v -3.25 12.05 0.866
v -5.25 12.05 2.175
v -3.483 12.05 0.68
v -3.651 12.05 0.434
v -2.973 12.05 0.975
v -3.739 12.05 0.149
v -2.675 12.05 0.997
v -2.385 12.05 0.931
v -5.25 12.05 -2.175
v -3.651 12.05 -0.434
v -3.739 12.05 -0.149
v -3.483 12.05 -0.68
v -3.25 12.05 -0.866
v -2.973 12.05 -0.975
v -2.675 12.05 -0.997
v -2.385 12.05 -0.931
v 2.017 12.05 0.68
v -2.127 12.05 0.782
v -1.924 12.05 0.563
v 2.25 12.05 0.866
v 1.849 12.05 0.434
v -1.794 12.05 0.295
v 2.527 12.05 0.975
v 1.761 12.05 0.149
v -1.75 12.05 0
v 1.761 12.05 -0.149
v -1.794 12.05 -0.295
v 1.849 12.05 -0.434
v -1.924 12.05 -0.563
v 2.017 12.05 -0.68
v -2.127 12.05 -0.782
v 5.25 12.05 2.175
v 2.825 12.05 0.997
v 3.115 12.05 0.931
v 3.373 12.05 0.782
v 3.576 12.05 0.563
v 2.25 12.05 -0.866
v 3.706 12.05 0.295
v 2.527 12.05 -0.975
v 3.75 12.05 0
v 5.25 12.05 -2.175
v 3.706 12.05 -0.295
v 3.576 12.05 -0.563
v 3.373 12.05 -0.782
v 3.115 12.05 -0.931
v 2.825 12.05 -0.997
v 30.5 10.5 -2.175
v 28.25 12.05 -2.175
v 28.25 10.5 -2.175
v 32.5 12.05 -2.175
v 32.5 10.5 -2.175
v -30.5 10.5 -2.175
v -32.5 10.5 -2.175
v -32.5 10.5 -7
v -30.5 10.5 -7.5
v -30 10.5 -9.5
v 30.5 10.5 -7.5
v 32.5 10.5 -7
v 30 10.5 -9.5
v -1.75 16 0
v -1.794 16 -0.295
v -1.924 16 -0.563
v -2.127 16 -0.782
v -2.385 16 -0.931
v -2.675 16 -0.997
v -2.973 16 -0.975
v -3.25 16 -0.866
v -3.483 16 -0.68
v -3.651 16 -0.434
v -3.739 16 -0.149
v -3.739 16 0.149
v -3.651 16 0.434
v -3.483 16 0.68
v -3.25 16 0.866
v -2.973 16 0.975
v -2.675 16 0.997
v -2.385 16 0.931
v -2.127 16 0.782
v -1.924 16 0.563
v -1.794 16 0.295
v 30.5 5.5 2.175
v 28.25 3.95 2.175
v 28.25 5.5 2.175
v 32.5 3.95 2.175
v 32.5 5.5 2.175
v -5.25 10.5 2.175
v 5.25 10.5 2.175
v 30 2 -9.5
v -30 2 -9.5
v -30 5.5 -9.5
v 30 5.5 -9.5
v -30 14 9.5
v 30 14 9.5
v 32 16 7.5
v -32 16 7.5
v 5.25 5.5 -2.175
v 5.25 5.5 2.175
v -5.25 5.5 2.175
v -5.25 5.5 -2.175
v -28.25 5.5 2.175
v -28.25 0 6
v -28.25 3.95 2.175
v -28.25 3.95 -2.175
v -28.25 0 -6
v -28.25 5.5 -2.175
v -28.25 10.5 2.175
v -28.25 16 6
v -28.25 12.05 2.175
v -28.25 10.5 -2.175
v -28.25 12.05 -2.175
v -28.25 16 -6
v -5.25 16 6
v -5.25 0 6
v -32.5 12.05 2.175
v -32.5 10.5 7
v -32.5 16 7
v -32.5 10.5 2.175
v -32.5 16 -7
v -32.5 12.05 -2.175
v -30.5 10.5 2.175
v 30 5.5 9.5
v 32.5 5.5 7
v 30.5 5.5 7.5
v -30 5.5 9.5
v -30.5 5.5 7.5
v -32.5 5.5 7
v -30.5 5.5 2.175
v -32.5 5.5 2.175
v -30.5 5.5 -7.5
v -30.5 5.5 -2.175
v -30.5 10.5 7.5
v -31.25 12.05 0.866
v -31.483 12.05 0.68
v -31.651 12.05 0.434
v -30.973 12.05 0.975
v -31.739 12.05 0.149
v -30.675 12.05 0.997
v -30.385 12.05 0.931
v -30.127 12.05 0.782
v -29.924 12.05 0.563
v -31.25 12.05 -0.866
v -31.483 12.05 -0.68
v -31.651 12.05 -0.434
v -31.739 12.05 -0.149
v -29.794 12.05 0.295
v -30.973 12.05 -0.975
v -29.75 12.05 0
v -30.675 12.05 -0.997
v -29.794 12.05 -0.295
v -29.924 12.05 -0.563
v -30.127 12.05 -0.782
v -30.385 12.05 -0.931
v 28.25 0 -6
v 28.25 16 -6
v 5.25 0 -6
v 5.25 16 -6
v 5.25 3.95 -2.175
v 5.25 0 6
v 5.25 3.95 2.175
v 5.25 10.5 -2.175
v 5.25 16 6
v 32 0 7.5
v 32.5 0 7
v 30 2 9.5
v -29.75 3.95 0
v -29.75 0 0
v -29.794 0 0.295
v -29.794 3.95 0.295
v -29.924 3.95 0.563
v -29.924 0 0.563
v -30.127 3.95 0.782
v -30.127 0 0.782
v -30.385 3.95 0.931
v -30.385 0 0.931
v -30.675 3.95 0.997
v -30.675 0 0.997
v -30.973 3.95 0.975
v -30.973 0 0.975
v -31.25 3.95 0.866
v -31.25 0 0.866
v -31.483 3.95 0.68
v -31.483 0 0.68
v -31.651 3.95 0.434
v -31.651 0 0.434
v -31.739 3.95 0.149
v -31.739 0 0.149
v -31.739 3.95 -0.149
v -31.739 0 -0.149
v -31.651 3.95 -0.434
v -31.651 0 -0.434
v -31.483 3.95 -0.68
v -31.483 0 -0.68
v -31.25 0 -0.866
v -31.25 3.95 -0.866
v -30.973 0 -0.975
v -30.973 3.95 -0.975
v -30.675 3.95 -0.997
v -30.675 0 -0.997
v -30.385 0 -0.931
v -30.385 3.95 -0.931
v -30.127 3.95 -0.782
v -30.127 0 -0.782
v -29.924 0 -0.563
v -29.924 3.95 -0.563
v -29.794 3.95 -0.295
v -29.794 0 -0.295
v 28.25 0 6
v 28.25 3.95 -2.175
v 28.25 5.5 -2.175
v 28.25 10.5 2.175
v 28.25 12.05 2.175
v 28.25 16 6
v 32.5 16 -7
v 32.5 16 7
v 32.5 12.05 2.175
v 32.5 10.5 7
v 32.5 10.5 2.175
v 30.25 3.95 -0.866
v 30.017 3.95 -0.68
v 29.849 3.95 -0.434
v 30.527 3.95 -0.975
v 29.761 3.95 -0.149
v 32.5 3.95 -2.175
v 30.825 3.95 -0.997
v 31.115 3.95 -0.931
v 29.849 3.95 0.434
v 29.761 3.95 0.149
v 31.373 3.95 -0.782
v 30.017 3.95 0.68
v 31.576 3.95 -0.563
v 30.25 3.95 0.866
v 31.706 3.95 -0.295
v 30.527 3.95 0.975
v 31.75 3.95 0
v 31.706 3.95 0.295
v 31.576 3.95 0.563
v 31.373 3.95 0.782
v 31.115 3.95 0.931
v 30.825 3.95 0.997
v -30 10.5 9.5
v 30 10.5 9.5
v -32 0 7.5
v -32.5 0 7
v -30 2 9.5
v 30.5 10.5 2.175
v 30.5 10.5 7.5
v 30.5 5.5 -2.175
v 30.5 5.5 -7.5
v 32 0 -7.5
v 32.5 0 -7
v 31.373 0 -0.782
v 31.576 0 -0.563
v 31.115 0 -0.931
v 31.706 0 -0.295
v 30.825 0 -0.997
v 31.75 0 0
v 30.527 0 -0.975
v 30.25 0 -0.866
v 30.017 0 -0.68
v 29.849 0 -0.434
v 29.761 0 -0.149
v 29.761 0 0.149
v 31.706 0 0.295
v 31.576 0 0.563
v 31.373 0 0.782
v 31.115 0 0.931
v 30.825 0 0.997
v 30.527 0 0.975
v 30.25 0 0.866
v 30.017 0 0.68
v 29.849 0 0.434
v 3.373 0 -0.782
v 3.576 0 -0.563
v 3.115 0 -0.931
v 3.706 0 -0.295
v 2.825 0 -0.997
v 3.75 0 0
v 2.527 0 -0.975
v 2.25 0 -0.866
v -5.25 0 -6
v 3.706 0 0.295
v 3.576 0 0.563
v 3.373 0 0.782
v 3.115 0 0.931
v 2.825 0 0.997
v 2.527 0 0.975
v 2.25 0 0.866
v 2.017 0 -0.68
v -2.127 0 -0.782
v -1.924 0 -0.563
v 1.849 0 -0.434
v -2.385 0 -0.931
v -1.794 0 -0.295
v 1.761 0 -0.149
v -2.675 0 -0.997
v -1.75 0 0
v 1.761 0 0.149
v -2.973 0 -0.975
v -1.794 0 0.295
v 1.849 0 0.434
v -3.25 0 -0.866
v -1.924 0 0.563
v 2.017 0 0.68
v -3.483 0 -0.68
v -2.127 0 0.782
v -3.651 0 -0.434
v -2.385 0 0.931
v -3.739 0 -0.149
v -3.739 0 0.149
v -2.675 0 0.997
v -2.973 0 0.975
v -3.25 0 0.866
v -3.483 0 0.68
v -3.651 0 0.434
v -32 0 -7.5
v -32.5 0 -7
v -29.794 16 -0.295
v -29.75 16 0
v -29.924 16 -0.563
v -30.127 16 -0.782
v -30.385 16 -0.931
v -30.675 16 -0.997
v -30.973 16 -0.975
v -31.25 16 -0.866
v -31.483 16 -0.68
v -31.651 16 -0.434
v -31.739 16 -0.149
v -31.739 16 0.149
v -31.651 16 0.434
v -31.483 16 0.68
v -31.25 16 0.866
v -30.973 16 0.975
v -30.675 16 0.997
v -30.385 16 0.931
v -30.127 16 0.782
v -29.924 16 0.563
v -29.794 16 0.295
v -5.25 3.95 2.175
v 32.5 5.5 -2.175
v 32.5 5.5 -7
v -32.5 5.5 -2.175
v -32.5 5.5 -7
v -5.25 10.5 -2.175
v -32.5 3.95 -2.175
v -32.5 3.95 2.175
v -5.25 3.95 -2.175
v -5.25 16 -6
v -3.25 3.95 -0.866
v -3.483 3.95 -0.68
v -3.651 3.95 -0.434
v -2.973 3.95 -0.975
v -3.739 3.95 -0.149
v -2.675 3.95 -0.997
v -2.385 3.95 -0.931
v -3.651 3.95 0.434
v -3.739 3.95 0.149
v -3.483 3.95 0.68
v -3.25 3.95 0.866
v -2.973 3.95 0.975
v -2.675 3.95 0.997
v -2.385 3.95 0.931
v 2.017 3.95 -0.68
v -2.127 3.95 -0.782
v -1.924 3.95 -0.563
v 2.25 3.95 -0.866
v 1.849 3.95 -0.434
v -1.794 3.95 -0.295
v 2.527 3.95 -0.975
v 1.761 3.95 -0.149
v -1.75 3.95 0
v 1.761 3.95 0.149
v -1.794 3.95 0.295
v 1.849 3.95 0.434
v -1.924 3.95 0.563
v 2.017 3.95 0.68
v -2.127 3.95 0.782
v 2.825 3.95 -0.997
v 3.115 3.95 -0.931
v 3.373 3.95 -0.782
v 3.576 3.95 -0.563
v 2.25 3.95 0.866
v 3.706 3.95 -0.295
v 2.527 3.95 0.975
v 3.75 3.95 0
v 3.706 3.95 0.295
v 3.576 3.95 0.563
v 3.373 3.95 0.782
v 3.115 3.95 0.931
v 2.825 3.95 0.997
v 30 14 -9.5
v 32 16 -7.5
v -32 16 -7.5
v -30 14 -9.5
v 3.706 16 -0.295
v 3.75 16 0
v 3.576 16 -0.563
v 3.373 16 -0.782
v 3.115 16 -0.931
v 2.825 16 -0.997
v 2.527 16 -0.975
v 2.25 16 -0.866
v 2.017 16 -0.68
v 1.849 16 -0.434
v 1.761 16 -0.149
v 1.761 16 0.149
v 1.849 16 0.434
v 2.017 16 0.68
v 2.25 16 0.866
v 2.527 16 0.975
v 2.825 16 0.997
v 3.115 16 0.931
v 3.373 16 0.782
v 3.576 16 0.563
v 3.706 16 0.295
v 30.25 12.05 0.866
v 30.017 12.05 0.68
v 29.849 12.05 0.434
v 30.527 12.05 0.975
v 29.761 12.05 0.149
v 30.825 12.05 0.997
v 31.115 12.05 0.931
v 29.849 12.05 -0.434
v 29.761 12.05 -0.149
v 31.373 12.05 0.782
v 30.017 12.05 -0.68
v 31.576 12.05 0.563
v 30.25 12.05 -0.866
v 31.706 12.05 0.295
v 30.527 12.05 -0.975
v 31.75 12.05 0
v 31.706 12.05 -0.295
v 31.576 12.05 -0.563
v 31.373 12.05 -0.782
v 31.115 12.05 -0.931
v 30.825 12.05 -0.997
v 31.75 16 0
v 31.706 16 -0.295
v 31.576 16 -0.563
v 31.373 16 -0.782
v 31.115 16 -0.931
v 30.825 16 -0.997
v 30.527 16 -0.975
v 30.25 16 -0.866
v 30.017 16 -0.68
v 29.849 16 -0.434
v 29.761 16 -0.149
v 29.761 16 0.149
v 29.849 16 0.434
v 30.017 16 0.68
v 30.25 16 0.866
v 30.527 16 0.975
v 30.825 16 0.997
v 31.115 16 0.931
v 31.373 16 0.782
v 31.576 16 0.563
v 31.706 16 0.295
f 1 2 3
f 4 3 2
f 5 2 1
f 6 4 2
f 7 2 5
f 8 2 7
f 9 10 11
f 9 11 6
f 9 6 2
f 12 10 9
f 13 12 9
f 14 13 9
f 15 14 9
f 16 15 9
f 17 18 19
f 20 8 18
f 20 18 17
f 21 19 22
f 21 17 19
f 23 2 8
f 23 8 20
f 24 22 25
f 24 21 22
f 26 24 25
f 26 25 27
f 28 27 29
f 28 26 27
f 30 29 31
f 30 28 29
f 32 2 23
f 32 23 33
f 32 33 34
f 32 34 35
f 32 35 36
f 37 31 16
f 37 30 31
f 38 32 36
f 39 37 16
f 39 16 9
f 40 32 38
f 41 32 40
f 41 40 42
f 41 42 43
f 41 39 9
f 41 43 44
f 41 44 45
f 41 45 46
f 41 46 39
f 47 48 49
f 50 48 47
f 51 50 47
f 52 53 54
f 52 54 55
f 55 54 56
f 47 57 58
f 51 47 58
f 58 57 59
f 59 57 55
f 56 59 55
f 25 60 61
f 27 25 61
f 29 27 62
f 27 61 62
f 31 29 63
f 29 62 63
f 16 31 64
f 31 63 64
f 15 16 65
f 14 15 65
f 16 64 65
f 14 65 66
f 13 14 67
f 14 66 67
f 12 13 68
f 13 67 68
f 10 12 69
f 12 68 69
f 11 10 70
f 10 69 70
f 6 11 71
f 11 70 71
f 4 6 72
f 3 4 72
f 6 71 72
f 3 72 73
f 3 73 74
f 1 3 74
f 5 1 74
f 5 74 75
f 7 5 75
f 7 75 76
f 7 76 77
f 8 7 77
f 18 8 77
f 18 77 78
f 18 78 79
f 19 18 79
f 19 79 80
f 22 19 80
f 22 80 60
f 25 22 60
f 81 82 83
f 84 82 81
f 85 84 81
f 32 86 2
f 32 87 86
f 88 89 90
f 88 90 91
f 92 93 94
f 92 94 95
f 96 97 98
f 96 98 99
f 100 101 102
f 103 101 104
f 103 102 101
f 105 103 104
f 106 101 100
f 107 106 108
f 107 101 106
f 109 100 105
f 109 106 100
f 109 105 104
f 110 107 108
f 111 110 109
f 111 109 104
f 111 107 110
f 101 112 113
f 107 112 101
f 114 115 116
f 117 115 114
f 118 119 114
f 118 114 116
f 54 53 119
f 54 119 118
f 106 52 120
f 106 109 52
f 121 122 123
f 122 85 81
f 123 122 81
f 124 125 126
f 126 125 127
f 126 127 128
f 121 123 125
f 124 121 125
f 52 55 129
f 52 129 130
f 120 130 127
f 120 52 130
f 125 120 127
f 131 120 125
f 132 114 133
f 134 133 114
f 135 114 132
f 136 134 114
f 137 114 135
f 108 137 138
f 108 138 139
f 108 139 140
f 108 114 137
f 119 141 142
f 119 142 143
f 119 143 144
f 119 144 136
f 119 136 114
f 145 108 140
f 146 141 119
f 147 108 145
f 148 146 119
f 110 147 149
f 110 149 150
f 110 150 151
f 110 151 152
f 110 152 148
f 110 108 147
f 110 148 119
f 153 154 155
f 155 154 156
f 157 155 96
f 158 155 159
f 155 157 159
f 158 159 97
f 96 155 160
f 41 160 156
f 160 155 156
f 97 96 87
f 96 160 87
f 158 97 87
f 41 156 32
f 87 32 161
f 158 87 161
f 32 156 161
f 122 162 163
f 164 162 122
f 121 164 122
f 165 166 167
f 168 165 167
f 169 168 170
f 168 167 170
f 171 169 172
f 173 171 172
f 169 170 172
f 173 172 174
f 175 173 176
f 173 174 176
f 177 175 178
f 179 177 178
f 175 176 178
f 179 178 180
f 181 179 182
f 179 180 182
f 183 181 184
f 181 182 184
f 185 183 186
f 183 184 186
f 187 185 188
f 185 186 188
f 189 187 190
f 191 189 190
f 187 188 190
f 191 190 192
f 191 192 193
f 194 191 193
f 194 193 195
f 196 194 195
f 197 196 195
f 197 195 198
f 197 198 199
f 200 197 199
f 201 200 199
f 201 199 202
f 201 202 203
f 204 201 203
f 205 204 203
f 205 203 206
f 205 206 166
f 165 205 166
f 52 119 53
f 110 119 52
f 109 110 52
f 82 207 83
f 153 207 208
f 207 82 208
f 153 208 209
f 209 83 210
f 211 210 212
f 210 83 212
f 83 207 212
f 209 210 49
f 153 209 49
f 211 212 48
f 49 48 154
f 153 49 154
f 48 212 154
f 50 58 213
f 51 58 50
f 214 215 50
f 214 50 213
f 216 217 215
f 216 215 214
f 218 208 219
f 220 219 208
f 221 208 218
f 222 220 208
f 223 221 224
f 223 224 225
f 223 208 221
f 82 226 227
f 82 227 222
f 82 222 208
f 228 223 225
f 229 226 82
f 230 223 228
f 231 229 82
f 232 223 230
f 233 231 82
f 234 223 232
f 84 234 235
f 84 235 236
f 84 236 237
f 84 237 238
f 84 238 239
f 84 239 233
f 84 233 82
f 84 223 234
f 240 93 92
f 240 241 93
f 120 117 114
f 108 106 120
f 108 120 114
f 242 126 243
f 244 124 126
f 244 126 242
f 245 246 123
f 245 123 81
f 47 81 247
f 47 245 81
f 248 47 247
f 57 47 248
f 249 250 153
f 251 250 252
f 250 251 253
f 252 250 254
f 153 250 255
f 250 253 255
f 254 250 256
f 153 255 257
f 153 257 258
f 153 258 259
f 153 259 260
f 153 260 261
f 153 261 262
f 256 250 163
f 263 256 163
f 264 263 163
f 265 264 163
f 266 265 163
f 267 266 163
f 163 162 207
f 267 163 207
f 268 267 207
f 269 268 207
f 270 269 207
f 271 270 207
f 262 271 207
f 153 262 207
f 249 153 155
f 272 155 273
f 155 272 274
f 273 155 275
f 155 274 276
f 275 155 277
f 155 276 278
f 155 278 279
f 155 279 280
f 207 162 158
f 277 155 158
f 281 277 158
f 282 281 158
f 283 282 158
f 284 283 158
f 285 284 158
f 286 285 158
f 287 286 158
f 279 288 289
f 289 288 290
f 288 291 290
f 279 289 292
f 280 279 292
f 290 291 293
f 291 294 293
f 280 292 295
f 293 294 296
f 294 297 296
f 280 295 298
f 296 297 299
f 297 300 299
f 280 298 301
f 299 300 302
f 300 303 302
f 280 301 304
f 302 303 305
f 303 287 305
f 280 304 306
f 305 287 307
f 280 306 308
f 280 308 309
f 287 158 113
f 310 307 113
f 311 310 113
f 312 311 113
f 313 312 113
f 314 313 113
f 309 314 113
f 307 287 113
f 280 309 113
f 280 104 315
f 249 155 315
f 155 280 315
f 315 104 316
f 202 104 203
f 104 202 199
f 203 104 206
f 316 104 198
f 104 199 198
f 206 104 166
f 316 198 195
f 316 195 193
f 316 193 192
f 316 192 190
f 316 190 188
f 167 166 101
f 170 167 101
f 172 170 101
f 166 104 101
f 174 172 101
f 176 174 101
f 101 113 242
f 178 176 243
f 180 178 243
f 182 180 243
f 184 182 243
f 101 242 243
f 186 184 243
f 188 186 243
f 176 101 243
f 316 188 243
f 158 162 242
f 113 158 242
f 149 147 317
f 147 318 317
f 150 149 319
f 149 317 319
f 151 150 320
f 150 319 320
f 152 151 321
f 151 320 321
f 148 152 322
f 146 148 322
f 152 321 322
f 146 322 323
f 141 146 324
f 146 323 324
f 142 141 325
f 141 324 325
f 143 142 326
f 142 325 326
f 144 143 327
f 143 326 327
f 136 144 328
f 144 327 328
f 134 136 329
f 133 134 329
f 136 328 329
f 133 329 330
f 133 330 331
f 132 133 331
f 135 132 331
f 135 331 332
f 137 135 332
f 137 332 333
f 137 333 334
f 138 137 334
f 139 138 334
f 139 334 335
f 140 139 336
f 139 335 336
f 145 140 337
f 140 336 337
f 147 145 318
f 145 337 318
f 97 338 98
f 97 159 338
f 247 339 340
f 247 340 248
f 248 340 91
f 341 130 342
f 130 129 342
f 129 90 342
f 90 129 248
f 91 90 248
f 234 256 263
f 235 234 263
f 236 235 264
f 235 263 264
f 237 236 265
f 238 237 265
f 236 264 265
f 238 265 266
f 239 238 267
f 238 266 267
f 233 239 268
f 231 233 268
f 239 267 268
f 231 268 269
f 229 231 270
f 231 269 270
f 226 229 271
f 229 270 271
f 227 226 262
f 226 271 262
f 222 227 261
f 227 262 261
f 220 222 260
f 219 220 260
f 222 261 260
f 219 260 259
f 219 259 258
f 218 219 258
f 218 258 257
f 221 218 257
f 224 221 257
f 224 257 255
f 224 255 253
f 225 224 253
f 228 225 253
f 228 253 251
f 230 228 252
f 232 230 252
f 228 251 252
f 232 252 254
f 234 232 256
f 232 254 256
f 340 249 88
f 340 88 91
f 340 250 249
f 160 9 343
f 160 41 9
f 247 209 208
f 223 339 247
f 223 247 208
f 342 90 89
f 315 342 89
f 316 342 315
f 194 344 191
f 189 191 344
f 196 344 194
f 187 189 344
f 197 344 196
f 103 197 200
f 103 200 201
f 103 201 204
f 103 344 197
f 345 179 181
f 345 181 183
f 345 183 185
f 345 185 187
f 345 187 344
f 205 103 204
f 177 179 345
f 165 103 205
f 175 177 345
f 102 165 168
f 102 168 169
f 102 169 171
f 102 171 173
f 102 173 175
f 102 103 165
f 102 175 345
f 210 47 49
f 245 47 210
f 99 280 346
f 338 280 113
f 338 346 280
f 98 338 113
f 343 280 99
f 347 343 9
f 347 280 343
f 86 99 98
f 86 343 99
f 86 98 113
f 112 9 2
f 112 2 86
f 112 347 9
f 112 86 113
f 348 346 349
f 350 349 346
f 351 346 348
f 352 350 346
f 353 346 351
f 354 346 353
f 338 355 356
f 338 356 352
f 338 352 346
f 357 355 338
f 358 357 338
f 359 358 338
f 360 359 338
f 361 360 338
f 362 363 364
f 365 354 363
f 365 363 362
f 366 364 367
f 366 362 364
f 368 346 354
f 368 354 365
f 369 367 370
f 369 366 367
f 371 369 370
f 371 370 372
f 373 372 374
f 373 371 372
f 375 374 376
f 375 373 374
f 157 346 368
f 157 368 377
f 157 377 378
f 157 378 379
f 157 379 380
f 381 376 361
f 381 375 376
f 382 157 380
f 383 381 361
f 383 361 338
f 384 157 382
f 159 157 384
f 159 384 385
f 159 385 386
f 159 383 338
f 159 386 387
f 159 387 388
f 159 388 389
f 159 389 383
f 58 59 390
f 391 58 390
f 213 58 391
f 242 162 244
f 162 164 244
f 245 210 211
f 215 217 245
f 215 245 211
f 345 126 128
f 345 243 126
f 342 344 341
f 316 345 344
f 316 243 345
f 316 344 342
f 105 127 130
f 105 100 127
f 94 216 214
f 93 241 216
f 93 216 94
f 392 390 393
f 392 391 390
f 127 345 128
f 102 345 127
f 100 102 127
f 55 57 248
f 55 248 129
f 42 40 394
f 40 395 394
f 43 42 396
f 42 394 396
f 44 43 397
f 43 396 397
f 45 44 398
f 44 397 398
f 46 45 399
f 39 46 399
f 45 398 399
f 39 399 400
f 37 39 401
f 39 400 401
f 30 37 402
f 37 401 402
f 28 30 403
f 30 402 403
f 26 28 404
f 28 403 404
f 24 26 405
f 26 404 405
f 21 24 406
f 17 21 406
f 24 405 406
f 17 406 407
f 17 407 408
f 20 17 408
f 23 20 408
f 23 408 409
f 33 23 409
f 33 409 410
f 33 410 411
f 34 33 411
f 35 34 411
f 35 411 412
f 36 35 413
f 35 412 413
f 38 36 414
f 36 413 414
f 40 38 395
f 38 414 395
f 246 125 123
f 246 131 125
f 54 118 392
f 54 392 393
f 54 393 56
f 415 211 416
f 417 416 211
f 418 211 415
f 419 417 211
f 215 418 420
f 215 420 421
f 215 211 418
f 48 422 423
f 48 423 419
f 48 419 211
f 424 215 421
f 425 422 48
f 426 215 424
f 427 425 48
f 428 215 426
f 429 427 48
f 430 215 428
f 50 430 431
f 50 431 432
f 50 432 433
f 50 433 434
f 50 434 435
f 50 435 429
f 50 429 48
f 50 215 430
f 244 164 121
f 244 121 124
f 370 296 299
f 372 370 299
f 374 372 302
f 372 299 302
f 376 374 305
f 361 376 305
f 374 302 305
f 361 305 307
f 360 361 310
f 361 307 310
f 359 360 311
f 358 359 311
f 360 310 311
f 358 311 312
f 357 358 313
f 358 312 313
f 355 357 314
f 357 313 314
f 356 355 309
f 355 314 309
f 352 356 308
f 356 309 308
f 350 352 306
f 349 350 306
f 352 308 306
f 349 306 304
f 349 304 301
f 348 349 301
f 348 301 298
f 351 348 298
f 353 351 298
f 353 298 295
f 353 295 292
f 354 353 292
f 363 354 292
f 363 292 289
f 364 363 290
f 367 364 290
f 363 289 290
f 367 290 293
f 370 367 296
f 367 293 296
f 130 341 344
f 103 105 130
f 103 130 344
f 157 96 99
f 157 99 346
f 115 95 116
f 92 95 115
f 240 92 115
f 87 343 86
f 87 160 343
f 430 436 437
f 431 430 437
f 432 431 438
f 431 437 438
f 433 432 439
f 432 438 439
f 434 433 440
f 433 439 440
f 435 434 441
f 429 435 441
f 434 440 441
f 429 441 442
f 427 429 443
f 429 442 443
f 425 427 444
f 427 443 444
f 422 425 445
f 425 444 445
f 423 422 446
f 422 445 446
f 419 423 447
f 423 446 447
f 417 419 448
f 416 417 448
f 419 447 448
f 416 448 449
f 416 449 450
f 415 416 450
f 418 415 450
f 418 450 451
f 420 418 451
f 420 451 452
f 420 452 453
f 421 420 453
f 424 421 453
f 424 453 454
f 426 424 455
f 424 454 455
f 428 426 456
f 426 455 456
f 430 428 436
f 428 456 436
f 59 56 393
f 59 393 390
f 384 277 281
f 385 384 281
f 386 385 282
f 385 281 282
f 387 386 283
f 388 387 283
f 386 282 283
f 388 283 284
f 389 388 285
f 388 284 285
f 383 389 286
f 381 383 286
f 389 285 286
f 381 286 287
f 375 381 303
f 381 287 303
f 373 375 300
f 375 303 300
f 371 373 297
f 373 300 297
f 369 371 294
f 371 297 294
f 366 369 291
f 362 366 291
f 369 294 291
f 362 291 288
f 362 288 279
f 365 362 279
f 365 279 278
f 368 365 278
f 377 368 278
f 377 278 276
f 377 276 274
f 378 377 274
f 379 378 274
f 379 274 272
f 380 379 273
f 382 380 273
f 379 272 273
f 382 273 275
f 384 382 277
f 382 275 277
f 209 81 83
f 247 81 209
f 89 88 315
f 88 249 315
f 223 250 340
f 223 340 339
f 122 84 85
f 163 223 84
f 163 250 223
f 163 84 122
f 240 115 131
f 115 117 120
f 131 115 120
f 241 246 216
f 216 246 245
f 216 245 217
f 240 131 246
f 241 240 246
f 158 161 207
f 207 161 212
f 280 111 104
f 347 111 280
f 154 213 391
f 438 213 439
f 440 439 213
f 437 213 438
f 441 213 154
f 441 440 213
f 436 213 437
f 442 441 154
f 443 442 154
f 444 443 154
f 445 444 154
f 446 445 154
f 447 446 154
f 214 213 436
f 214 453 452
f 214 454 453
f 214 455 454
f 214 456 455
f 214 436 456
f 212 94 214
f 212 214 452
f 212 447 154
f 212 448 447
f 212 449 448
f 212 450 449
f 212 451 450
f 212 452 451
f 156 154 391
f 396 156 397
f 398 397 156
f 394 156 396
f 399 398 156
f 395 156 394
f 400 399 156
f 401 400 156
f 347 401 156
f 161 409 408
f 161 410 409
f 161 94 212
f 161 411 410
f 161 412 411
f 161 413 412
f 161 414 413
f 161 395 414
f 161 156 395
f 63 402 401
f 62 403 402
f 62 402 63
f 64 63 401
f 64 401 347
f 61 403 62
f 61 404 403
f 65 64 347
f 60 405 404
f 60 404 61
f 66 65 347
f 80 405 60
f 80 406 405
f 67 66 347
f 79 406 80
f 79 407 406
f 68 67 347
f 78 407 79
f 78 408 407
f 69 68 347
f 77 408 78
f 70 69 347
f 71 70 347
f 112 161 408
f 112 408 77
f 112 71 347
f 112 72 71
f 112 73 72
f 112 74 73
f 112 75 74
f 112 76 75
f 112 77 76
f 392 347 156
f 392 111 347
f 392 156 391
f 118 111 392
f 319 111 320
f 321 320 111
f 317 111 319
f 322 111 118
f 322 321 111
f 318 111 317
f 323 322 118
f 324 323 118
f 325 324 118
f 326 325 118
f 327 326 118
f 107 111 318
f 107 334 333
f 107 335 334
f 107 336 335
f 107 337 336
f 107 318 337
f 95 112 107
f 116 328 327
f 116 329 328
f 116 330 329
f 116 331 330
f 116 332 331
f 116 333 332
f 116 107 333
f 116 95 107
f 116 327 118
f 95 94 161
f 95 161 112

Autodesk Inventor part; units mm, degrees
ref_plane "YZ Plane" through (0, 0, 0) normal (1, 0, 0) x (0, 1, 0)
ref_plane "XZ Plane" through (0, 0, 0) normal (0, 1, 0) x (-1, 0, 0)
ref_plane "XY Plane" through (0, 0, 0) normal (0, 0, 1) x (1, 0, 0)
sketch "Sketch1" plane through (0, 0, 0) normal (0, 1, 0) x (-1, 0, 0)
  line L0 (32.5, -9.5) -> (-32.5, -9.5)
  line L1 (-32.5, -9.5) -> (-32.5, 9.5)
  line L2 (-32.5, 9.5) -> (32.5, 9.5)
  line L3 (32.5, 9.5) -> (32.5, -9.5)
  point P0 (0, 0)
  point P1 (0, -9.5)
  point P2 (32.5, 0)
  dimension "d0" = 65
  dimension "d1" = 19
extrude "Extrusion1" add sketch "Sketch1" along normal blind 16
sketch "Sketch2" plane through (0, 16, 0) normal (0, 1, 0) x (1, 0, 0)
  line L0 (-28.25, 6) -> (-5.25, 6)
  line L1 (-5.25, 6) -> (-5.25, -6)
  line L2 (-5.25, -6) -> (-28.25, -6)
  line L3 (-28.25, -6) -> (-28.25, 6)
  line L4 (0, 13.3) -> (0, -13.3) construction
  line L5 (-32.5, 9.5) -> (-32.5, -9.5) projected
  line L6 (28.25, 6) -> (5.25, 6)
  line L7 (5.25, 6) -> (5.25, -6)
  line L8 (5.25, -6) -> (28.25, -6)
  line L9 (28.25, -6) -> (28.25, 6)
  point P0 (0, 0)
  point P1 (-5.25, 0)
  dimension "d4" = 23
  dimension "d5" = 12
  dimension "d9" = 4.25
extrude "Extrusion2" cut sketch "Sketch2" against normal through all
chamfer "Chamfer1" distance 2.5 angle 45 4 edges at (-32.5, 8, 9.5) (-32.5, 8, -9.5) (32.5, 8, 9.5) (32.5, 8, -9.5)
chamfer "Chamfer2" distance 2 angle 45 4 edges at (0, 16, -9.5) (0, 16, 9.5) (0, 0, 9.5) (0, 0, -9.5)
sketch "Sketch3" plane through (-30, 2, 9.5) normal (0, 0, 1) x (1, 0, 0)
  line L0 (-2.5, 8.5) -> (62.5, 8.5)
  line L1 (62.5, 8.5) -> (62.5, 3.5)
  line L2 (62.5, 3.5) -> (-2.5, 3.5)
  line L3 (-2.5, 3.5) -> (-2.5, 8.5)
  line L4 (-2.5, 14) -> (-2.5, -2) projected
  line L5 (62.5, -2) -> (62.5, 14) projected
  point P0 (30, -2)
  point P1 (62.5, 6)
  point P2 (62.5, 6)
  dimension "d18" = 5
extrude "Extrusion3" cut sketch "Sketch3" against normal blind 2
sketch "Sketch5" plane through (30, 2, -9.5) normal (0, 0, -1) x (-1, 0, 0)
  line L0 (-2.5, 3.5) -> (62.5, 3.5)
  line L1 (62.5, 3.5) -> (62.5, 8.5)
  line L2 (62.5, 8.5) -> (-2.5, 8.5)
  line L3 (-2.5, 8.5) -> (-2.5, 3.5)
  line L4 (-2.5, 14) -> (-2.5, -2) projected
  line L5 (62.5, -2) -> (62.5, 14) projected
  point P0 (30, -2)
  point P1 (62.5, 6)
  point P2 (62.5, 6)
  dimension "d21" = 5
extrude "Extrusion4" cut sketch "Sketch5" against normal blind 2
sketch "Sketch6" plane through (-32.5, 0, -7) normal (-1, 0, 0) x (0, 0, 1)
  line L0 (-0.5, 5.5) -> (-2.5, 5.5) projected
  line L1 (16.5, 10.5) -> (-2.5, 10.5)
  line L2 (-2.5, 10.5) -> (-2.5, 5.5)
  line L3 (-2.5, 5.5) -> (16.5, 5.5)
  line L4 (16.5, 5.5) -> (16.5, 10.5)
  point P0 (7, 0)
  point P1 (16.5, 5.5)
  point P2 (-2.5, 10.5)
extrude "Extrusion5" cut sketch "Sketch6" against normal blind 2
sketch "Sketch7" plane through (32.5, 0, 7) normal (1, 0, 0) x (0, 0, -1)
  line L0 (0, 10.5) -> (-2.5, 10.5) projected
  line L1 (-2.5, 10.5) -> (16.5, 10.5)
  line L2 (16.5, 10.5) -> (16.5, 5.5)
  line L3 (16.5, 5.5) -> (-2.5, 5.5)
  line L4 (-2.5, 5.5) -> (-2.5, 10.5)
  point P0 (7, 0)
extrude "Extrusion6" cut sketch "Sketch7" against normal blind 2
sketch "Sketch8" plane through (32.5, 16, 7) normal (1, 0, 0) x (0, 0, -1)
  line L0 (4.825, -3.95) -> (9.175, -3.95)
  line L1 (9.175, -3.95) -> (9.175, -5.5)
  line L2 (9.175, -5.5) -> (4.825, -5.5)
  line L3 (4.825, -5.5) -> (4.825, -3.95)
  line L4 (4.825, -10.5) -> (9.175, -10.5)
  line L5 (9.175, -10.5) -> (9.175, -12.05)
  line L6 (9.175, -12.05) -> (4.825, -12.05)
  line L7 (4.825, -12.05) -> (4.825, -10.5)
  line L8 (14, -16) -> (0, -16) projected
  line L9 (0, -5.5) -> (14, -5.5) projected
  line L10 (14, -10.5) -> (0, -10.5) projected
  point P0 (7, -16)
  point P1 (7, -3.95)
  point P2 (7, -10.5)
  point P3 (7, -12.05)
  point P4 (7, -16)
  dimension "d28" = 4.35
  dimension "d29" = 1.55
extrude "Extrusion7" cut sketch "Sketch8" against normal through all
sketch "Sketch9" plane through (0, 16, 0) normal (0, 1, 0) x (1, 0, 0)
  circle A0 centre (30.75, 0) radius 1
  circle A1 centre (2.75, 0) radius 1
  line L0 (0, 13.3) -> (0, -13.3) projected
  line L1 (28.25, 6) -> (28.25, -6) projected
  line L2 (5.25, -6) -> (5.25, 6) projected
  circle A2 centre (-30.75, 0) radius 1
  circle A3 centre (-2.75, 0) radius 1
  point P0 (0, 0)
  dimension "d32" = 2
  dimension "d33" = 1.5
  dimension "d34" = 1.5
extrude "Extrusion8" cut sketch "Sketch9" against normal up to surface (3.95 mm away)
sketch "Sketch10" plane through (0, 0, 0) normal (0, -1, 0) x (1, 0, 0)
  line L0 (0, -13.3) -> (0, 13.3) projected
  circle A0 centre (-30.75, 0) radius 1
  circle A1 centre (-2.75, 0) radius 1
  line L1 (-28.25, -6) -> (-28.25, 6) projected
  line L2 (-5.25, 6) -> (-5.25, -6) projected
  circle A2 centre (30.75, 0) radius 1
  circle A3 centre (2.75, 0) radius 1
  point P0 (0, 0)
  dimension "d37" = 2
  dimension "d38" = 1.5
  dimension "d39" = 1.5
extrude "Extrusion9" cut sketch "Sketch10" against normal up to surface (3.95 mm away)
equation "\"d4\" = servo_A"
equation "\"d5\" = servo_B"
equation "\"d9\" = -0.5 * servo_A + 0.5 * servo_D"
equation "\"d18\" = servo_K"
equation "\"d21\" = servo_K"
equation "\"d28\" = nut_A"
equation "\"d29\" = nut_B"
equation "\"d32\" = servo_H"
equation "\"d33\" = servo_L"
equation "\"d34\" = servo_L"
equation "\"d37\" = servo_H"
equation "\"d38\" = servo_L"
equation "\"d39\" = servo_L"
equation "\"servo_A\" = 23"
equation "\"servo_B\" = 12"
equation "\"servo_D\" = 31.5"
equation "\"servo_K\" = 5"
equation "\"nut_A\" = 4.35"
equation "\"nut_B\" = 1.55"
equation "\"servo_H\" = 2"
equation "\"servo_L\" = 1.5"
properties part number "FEMUR2_A"
